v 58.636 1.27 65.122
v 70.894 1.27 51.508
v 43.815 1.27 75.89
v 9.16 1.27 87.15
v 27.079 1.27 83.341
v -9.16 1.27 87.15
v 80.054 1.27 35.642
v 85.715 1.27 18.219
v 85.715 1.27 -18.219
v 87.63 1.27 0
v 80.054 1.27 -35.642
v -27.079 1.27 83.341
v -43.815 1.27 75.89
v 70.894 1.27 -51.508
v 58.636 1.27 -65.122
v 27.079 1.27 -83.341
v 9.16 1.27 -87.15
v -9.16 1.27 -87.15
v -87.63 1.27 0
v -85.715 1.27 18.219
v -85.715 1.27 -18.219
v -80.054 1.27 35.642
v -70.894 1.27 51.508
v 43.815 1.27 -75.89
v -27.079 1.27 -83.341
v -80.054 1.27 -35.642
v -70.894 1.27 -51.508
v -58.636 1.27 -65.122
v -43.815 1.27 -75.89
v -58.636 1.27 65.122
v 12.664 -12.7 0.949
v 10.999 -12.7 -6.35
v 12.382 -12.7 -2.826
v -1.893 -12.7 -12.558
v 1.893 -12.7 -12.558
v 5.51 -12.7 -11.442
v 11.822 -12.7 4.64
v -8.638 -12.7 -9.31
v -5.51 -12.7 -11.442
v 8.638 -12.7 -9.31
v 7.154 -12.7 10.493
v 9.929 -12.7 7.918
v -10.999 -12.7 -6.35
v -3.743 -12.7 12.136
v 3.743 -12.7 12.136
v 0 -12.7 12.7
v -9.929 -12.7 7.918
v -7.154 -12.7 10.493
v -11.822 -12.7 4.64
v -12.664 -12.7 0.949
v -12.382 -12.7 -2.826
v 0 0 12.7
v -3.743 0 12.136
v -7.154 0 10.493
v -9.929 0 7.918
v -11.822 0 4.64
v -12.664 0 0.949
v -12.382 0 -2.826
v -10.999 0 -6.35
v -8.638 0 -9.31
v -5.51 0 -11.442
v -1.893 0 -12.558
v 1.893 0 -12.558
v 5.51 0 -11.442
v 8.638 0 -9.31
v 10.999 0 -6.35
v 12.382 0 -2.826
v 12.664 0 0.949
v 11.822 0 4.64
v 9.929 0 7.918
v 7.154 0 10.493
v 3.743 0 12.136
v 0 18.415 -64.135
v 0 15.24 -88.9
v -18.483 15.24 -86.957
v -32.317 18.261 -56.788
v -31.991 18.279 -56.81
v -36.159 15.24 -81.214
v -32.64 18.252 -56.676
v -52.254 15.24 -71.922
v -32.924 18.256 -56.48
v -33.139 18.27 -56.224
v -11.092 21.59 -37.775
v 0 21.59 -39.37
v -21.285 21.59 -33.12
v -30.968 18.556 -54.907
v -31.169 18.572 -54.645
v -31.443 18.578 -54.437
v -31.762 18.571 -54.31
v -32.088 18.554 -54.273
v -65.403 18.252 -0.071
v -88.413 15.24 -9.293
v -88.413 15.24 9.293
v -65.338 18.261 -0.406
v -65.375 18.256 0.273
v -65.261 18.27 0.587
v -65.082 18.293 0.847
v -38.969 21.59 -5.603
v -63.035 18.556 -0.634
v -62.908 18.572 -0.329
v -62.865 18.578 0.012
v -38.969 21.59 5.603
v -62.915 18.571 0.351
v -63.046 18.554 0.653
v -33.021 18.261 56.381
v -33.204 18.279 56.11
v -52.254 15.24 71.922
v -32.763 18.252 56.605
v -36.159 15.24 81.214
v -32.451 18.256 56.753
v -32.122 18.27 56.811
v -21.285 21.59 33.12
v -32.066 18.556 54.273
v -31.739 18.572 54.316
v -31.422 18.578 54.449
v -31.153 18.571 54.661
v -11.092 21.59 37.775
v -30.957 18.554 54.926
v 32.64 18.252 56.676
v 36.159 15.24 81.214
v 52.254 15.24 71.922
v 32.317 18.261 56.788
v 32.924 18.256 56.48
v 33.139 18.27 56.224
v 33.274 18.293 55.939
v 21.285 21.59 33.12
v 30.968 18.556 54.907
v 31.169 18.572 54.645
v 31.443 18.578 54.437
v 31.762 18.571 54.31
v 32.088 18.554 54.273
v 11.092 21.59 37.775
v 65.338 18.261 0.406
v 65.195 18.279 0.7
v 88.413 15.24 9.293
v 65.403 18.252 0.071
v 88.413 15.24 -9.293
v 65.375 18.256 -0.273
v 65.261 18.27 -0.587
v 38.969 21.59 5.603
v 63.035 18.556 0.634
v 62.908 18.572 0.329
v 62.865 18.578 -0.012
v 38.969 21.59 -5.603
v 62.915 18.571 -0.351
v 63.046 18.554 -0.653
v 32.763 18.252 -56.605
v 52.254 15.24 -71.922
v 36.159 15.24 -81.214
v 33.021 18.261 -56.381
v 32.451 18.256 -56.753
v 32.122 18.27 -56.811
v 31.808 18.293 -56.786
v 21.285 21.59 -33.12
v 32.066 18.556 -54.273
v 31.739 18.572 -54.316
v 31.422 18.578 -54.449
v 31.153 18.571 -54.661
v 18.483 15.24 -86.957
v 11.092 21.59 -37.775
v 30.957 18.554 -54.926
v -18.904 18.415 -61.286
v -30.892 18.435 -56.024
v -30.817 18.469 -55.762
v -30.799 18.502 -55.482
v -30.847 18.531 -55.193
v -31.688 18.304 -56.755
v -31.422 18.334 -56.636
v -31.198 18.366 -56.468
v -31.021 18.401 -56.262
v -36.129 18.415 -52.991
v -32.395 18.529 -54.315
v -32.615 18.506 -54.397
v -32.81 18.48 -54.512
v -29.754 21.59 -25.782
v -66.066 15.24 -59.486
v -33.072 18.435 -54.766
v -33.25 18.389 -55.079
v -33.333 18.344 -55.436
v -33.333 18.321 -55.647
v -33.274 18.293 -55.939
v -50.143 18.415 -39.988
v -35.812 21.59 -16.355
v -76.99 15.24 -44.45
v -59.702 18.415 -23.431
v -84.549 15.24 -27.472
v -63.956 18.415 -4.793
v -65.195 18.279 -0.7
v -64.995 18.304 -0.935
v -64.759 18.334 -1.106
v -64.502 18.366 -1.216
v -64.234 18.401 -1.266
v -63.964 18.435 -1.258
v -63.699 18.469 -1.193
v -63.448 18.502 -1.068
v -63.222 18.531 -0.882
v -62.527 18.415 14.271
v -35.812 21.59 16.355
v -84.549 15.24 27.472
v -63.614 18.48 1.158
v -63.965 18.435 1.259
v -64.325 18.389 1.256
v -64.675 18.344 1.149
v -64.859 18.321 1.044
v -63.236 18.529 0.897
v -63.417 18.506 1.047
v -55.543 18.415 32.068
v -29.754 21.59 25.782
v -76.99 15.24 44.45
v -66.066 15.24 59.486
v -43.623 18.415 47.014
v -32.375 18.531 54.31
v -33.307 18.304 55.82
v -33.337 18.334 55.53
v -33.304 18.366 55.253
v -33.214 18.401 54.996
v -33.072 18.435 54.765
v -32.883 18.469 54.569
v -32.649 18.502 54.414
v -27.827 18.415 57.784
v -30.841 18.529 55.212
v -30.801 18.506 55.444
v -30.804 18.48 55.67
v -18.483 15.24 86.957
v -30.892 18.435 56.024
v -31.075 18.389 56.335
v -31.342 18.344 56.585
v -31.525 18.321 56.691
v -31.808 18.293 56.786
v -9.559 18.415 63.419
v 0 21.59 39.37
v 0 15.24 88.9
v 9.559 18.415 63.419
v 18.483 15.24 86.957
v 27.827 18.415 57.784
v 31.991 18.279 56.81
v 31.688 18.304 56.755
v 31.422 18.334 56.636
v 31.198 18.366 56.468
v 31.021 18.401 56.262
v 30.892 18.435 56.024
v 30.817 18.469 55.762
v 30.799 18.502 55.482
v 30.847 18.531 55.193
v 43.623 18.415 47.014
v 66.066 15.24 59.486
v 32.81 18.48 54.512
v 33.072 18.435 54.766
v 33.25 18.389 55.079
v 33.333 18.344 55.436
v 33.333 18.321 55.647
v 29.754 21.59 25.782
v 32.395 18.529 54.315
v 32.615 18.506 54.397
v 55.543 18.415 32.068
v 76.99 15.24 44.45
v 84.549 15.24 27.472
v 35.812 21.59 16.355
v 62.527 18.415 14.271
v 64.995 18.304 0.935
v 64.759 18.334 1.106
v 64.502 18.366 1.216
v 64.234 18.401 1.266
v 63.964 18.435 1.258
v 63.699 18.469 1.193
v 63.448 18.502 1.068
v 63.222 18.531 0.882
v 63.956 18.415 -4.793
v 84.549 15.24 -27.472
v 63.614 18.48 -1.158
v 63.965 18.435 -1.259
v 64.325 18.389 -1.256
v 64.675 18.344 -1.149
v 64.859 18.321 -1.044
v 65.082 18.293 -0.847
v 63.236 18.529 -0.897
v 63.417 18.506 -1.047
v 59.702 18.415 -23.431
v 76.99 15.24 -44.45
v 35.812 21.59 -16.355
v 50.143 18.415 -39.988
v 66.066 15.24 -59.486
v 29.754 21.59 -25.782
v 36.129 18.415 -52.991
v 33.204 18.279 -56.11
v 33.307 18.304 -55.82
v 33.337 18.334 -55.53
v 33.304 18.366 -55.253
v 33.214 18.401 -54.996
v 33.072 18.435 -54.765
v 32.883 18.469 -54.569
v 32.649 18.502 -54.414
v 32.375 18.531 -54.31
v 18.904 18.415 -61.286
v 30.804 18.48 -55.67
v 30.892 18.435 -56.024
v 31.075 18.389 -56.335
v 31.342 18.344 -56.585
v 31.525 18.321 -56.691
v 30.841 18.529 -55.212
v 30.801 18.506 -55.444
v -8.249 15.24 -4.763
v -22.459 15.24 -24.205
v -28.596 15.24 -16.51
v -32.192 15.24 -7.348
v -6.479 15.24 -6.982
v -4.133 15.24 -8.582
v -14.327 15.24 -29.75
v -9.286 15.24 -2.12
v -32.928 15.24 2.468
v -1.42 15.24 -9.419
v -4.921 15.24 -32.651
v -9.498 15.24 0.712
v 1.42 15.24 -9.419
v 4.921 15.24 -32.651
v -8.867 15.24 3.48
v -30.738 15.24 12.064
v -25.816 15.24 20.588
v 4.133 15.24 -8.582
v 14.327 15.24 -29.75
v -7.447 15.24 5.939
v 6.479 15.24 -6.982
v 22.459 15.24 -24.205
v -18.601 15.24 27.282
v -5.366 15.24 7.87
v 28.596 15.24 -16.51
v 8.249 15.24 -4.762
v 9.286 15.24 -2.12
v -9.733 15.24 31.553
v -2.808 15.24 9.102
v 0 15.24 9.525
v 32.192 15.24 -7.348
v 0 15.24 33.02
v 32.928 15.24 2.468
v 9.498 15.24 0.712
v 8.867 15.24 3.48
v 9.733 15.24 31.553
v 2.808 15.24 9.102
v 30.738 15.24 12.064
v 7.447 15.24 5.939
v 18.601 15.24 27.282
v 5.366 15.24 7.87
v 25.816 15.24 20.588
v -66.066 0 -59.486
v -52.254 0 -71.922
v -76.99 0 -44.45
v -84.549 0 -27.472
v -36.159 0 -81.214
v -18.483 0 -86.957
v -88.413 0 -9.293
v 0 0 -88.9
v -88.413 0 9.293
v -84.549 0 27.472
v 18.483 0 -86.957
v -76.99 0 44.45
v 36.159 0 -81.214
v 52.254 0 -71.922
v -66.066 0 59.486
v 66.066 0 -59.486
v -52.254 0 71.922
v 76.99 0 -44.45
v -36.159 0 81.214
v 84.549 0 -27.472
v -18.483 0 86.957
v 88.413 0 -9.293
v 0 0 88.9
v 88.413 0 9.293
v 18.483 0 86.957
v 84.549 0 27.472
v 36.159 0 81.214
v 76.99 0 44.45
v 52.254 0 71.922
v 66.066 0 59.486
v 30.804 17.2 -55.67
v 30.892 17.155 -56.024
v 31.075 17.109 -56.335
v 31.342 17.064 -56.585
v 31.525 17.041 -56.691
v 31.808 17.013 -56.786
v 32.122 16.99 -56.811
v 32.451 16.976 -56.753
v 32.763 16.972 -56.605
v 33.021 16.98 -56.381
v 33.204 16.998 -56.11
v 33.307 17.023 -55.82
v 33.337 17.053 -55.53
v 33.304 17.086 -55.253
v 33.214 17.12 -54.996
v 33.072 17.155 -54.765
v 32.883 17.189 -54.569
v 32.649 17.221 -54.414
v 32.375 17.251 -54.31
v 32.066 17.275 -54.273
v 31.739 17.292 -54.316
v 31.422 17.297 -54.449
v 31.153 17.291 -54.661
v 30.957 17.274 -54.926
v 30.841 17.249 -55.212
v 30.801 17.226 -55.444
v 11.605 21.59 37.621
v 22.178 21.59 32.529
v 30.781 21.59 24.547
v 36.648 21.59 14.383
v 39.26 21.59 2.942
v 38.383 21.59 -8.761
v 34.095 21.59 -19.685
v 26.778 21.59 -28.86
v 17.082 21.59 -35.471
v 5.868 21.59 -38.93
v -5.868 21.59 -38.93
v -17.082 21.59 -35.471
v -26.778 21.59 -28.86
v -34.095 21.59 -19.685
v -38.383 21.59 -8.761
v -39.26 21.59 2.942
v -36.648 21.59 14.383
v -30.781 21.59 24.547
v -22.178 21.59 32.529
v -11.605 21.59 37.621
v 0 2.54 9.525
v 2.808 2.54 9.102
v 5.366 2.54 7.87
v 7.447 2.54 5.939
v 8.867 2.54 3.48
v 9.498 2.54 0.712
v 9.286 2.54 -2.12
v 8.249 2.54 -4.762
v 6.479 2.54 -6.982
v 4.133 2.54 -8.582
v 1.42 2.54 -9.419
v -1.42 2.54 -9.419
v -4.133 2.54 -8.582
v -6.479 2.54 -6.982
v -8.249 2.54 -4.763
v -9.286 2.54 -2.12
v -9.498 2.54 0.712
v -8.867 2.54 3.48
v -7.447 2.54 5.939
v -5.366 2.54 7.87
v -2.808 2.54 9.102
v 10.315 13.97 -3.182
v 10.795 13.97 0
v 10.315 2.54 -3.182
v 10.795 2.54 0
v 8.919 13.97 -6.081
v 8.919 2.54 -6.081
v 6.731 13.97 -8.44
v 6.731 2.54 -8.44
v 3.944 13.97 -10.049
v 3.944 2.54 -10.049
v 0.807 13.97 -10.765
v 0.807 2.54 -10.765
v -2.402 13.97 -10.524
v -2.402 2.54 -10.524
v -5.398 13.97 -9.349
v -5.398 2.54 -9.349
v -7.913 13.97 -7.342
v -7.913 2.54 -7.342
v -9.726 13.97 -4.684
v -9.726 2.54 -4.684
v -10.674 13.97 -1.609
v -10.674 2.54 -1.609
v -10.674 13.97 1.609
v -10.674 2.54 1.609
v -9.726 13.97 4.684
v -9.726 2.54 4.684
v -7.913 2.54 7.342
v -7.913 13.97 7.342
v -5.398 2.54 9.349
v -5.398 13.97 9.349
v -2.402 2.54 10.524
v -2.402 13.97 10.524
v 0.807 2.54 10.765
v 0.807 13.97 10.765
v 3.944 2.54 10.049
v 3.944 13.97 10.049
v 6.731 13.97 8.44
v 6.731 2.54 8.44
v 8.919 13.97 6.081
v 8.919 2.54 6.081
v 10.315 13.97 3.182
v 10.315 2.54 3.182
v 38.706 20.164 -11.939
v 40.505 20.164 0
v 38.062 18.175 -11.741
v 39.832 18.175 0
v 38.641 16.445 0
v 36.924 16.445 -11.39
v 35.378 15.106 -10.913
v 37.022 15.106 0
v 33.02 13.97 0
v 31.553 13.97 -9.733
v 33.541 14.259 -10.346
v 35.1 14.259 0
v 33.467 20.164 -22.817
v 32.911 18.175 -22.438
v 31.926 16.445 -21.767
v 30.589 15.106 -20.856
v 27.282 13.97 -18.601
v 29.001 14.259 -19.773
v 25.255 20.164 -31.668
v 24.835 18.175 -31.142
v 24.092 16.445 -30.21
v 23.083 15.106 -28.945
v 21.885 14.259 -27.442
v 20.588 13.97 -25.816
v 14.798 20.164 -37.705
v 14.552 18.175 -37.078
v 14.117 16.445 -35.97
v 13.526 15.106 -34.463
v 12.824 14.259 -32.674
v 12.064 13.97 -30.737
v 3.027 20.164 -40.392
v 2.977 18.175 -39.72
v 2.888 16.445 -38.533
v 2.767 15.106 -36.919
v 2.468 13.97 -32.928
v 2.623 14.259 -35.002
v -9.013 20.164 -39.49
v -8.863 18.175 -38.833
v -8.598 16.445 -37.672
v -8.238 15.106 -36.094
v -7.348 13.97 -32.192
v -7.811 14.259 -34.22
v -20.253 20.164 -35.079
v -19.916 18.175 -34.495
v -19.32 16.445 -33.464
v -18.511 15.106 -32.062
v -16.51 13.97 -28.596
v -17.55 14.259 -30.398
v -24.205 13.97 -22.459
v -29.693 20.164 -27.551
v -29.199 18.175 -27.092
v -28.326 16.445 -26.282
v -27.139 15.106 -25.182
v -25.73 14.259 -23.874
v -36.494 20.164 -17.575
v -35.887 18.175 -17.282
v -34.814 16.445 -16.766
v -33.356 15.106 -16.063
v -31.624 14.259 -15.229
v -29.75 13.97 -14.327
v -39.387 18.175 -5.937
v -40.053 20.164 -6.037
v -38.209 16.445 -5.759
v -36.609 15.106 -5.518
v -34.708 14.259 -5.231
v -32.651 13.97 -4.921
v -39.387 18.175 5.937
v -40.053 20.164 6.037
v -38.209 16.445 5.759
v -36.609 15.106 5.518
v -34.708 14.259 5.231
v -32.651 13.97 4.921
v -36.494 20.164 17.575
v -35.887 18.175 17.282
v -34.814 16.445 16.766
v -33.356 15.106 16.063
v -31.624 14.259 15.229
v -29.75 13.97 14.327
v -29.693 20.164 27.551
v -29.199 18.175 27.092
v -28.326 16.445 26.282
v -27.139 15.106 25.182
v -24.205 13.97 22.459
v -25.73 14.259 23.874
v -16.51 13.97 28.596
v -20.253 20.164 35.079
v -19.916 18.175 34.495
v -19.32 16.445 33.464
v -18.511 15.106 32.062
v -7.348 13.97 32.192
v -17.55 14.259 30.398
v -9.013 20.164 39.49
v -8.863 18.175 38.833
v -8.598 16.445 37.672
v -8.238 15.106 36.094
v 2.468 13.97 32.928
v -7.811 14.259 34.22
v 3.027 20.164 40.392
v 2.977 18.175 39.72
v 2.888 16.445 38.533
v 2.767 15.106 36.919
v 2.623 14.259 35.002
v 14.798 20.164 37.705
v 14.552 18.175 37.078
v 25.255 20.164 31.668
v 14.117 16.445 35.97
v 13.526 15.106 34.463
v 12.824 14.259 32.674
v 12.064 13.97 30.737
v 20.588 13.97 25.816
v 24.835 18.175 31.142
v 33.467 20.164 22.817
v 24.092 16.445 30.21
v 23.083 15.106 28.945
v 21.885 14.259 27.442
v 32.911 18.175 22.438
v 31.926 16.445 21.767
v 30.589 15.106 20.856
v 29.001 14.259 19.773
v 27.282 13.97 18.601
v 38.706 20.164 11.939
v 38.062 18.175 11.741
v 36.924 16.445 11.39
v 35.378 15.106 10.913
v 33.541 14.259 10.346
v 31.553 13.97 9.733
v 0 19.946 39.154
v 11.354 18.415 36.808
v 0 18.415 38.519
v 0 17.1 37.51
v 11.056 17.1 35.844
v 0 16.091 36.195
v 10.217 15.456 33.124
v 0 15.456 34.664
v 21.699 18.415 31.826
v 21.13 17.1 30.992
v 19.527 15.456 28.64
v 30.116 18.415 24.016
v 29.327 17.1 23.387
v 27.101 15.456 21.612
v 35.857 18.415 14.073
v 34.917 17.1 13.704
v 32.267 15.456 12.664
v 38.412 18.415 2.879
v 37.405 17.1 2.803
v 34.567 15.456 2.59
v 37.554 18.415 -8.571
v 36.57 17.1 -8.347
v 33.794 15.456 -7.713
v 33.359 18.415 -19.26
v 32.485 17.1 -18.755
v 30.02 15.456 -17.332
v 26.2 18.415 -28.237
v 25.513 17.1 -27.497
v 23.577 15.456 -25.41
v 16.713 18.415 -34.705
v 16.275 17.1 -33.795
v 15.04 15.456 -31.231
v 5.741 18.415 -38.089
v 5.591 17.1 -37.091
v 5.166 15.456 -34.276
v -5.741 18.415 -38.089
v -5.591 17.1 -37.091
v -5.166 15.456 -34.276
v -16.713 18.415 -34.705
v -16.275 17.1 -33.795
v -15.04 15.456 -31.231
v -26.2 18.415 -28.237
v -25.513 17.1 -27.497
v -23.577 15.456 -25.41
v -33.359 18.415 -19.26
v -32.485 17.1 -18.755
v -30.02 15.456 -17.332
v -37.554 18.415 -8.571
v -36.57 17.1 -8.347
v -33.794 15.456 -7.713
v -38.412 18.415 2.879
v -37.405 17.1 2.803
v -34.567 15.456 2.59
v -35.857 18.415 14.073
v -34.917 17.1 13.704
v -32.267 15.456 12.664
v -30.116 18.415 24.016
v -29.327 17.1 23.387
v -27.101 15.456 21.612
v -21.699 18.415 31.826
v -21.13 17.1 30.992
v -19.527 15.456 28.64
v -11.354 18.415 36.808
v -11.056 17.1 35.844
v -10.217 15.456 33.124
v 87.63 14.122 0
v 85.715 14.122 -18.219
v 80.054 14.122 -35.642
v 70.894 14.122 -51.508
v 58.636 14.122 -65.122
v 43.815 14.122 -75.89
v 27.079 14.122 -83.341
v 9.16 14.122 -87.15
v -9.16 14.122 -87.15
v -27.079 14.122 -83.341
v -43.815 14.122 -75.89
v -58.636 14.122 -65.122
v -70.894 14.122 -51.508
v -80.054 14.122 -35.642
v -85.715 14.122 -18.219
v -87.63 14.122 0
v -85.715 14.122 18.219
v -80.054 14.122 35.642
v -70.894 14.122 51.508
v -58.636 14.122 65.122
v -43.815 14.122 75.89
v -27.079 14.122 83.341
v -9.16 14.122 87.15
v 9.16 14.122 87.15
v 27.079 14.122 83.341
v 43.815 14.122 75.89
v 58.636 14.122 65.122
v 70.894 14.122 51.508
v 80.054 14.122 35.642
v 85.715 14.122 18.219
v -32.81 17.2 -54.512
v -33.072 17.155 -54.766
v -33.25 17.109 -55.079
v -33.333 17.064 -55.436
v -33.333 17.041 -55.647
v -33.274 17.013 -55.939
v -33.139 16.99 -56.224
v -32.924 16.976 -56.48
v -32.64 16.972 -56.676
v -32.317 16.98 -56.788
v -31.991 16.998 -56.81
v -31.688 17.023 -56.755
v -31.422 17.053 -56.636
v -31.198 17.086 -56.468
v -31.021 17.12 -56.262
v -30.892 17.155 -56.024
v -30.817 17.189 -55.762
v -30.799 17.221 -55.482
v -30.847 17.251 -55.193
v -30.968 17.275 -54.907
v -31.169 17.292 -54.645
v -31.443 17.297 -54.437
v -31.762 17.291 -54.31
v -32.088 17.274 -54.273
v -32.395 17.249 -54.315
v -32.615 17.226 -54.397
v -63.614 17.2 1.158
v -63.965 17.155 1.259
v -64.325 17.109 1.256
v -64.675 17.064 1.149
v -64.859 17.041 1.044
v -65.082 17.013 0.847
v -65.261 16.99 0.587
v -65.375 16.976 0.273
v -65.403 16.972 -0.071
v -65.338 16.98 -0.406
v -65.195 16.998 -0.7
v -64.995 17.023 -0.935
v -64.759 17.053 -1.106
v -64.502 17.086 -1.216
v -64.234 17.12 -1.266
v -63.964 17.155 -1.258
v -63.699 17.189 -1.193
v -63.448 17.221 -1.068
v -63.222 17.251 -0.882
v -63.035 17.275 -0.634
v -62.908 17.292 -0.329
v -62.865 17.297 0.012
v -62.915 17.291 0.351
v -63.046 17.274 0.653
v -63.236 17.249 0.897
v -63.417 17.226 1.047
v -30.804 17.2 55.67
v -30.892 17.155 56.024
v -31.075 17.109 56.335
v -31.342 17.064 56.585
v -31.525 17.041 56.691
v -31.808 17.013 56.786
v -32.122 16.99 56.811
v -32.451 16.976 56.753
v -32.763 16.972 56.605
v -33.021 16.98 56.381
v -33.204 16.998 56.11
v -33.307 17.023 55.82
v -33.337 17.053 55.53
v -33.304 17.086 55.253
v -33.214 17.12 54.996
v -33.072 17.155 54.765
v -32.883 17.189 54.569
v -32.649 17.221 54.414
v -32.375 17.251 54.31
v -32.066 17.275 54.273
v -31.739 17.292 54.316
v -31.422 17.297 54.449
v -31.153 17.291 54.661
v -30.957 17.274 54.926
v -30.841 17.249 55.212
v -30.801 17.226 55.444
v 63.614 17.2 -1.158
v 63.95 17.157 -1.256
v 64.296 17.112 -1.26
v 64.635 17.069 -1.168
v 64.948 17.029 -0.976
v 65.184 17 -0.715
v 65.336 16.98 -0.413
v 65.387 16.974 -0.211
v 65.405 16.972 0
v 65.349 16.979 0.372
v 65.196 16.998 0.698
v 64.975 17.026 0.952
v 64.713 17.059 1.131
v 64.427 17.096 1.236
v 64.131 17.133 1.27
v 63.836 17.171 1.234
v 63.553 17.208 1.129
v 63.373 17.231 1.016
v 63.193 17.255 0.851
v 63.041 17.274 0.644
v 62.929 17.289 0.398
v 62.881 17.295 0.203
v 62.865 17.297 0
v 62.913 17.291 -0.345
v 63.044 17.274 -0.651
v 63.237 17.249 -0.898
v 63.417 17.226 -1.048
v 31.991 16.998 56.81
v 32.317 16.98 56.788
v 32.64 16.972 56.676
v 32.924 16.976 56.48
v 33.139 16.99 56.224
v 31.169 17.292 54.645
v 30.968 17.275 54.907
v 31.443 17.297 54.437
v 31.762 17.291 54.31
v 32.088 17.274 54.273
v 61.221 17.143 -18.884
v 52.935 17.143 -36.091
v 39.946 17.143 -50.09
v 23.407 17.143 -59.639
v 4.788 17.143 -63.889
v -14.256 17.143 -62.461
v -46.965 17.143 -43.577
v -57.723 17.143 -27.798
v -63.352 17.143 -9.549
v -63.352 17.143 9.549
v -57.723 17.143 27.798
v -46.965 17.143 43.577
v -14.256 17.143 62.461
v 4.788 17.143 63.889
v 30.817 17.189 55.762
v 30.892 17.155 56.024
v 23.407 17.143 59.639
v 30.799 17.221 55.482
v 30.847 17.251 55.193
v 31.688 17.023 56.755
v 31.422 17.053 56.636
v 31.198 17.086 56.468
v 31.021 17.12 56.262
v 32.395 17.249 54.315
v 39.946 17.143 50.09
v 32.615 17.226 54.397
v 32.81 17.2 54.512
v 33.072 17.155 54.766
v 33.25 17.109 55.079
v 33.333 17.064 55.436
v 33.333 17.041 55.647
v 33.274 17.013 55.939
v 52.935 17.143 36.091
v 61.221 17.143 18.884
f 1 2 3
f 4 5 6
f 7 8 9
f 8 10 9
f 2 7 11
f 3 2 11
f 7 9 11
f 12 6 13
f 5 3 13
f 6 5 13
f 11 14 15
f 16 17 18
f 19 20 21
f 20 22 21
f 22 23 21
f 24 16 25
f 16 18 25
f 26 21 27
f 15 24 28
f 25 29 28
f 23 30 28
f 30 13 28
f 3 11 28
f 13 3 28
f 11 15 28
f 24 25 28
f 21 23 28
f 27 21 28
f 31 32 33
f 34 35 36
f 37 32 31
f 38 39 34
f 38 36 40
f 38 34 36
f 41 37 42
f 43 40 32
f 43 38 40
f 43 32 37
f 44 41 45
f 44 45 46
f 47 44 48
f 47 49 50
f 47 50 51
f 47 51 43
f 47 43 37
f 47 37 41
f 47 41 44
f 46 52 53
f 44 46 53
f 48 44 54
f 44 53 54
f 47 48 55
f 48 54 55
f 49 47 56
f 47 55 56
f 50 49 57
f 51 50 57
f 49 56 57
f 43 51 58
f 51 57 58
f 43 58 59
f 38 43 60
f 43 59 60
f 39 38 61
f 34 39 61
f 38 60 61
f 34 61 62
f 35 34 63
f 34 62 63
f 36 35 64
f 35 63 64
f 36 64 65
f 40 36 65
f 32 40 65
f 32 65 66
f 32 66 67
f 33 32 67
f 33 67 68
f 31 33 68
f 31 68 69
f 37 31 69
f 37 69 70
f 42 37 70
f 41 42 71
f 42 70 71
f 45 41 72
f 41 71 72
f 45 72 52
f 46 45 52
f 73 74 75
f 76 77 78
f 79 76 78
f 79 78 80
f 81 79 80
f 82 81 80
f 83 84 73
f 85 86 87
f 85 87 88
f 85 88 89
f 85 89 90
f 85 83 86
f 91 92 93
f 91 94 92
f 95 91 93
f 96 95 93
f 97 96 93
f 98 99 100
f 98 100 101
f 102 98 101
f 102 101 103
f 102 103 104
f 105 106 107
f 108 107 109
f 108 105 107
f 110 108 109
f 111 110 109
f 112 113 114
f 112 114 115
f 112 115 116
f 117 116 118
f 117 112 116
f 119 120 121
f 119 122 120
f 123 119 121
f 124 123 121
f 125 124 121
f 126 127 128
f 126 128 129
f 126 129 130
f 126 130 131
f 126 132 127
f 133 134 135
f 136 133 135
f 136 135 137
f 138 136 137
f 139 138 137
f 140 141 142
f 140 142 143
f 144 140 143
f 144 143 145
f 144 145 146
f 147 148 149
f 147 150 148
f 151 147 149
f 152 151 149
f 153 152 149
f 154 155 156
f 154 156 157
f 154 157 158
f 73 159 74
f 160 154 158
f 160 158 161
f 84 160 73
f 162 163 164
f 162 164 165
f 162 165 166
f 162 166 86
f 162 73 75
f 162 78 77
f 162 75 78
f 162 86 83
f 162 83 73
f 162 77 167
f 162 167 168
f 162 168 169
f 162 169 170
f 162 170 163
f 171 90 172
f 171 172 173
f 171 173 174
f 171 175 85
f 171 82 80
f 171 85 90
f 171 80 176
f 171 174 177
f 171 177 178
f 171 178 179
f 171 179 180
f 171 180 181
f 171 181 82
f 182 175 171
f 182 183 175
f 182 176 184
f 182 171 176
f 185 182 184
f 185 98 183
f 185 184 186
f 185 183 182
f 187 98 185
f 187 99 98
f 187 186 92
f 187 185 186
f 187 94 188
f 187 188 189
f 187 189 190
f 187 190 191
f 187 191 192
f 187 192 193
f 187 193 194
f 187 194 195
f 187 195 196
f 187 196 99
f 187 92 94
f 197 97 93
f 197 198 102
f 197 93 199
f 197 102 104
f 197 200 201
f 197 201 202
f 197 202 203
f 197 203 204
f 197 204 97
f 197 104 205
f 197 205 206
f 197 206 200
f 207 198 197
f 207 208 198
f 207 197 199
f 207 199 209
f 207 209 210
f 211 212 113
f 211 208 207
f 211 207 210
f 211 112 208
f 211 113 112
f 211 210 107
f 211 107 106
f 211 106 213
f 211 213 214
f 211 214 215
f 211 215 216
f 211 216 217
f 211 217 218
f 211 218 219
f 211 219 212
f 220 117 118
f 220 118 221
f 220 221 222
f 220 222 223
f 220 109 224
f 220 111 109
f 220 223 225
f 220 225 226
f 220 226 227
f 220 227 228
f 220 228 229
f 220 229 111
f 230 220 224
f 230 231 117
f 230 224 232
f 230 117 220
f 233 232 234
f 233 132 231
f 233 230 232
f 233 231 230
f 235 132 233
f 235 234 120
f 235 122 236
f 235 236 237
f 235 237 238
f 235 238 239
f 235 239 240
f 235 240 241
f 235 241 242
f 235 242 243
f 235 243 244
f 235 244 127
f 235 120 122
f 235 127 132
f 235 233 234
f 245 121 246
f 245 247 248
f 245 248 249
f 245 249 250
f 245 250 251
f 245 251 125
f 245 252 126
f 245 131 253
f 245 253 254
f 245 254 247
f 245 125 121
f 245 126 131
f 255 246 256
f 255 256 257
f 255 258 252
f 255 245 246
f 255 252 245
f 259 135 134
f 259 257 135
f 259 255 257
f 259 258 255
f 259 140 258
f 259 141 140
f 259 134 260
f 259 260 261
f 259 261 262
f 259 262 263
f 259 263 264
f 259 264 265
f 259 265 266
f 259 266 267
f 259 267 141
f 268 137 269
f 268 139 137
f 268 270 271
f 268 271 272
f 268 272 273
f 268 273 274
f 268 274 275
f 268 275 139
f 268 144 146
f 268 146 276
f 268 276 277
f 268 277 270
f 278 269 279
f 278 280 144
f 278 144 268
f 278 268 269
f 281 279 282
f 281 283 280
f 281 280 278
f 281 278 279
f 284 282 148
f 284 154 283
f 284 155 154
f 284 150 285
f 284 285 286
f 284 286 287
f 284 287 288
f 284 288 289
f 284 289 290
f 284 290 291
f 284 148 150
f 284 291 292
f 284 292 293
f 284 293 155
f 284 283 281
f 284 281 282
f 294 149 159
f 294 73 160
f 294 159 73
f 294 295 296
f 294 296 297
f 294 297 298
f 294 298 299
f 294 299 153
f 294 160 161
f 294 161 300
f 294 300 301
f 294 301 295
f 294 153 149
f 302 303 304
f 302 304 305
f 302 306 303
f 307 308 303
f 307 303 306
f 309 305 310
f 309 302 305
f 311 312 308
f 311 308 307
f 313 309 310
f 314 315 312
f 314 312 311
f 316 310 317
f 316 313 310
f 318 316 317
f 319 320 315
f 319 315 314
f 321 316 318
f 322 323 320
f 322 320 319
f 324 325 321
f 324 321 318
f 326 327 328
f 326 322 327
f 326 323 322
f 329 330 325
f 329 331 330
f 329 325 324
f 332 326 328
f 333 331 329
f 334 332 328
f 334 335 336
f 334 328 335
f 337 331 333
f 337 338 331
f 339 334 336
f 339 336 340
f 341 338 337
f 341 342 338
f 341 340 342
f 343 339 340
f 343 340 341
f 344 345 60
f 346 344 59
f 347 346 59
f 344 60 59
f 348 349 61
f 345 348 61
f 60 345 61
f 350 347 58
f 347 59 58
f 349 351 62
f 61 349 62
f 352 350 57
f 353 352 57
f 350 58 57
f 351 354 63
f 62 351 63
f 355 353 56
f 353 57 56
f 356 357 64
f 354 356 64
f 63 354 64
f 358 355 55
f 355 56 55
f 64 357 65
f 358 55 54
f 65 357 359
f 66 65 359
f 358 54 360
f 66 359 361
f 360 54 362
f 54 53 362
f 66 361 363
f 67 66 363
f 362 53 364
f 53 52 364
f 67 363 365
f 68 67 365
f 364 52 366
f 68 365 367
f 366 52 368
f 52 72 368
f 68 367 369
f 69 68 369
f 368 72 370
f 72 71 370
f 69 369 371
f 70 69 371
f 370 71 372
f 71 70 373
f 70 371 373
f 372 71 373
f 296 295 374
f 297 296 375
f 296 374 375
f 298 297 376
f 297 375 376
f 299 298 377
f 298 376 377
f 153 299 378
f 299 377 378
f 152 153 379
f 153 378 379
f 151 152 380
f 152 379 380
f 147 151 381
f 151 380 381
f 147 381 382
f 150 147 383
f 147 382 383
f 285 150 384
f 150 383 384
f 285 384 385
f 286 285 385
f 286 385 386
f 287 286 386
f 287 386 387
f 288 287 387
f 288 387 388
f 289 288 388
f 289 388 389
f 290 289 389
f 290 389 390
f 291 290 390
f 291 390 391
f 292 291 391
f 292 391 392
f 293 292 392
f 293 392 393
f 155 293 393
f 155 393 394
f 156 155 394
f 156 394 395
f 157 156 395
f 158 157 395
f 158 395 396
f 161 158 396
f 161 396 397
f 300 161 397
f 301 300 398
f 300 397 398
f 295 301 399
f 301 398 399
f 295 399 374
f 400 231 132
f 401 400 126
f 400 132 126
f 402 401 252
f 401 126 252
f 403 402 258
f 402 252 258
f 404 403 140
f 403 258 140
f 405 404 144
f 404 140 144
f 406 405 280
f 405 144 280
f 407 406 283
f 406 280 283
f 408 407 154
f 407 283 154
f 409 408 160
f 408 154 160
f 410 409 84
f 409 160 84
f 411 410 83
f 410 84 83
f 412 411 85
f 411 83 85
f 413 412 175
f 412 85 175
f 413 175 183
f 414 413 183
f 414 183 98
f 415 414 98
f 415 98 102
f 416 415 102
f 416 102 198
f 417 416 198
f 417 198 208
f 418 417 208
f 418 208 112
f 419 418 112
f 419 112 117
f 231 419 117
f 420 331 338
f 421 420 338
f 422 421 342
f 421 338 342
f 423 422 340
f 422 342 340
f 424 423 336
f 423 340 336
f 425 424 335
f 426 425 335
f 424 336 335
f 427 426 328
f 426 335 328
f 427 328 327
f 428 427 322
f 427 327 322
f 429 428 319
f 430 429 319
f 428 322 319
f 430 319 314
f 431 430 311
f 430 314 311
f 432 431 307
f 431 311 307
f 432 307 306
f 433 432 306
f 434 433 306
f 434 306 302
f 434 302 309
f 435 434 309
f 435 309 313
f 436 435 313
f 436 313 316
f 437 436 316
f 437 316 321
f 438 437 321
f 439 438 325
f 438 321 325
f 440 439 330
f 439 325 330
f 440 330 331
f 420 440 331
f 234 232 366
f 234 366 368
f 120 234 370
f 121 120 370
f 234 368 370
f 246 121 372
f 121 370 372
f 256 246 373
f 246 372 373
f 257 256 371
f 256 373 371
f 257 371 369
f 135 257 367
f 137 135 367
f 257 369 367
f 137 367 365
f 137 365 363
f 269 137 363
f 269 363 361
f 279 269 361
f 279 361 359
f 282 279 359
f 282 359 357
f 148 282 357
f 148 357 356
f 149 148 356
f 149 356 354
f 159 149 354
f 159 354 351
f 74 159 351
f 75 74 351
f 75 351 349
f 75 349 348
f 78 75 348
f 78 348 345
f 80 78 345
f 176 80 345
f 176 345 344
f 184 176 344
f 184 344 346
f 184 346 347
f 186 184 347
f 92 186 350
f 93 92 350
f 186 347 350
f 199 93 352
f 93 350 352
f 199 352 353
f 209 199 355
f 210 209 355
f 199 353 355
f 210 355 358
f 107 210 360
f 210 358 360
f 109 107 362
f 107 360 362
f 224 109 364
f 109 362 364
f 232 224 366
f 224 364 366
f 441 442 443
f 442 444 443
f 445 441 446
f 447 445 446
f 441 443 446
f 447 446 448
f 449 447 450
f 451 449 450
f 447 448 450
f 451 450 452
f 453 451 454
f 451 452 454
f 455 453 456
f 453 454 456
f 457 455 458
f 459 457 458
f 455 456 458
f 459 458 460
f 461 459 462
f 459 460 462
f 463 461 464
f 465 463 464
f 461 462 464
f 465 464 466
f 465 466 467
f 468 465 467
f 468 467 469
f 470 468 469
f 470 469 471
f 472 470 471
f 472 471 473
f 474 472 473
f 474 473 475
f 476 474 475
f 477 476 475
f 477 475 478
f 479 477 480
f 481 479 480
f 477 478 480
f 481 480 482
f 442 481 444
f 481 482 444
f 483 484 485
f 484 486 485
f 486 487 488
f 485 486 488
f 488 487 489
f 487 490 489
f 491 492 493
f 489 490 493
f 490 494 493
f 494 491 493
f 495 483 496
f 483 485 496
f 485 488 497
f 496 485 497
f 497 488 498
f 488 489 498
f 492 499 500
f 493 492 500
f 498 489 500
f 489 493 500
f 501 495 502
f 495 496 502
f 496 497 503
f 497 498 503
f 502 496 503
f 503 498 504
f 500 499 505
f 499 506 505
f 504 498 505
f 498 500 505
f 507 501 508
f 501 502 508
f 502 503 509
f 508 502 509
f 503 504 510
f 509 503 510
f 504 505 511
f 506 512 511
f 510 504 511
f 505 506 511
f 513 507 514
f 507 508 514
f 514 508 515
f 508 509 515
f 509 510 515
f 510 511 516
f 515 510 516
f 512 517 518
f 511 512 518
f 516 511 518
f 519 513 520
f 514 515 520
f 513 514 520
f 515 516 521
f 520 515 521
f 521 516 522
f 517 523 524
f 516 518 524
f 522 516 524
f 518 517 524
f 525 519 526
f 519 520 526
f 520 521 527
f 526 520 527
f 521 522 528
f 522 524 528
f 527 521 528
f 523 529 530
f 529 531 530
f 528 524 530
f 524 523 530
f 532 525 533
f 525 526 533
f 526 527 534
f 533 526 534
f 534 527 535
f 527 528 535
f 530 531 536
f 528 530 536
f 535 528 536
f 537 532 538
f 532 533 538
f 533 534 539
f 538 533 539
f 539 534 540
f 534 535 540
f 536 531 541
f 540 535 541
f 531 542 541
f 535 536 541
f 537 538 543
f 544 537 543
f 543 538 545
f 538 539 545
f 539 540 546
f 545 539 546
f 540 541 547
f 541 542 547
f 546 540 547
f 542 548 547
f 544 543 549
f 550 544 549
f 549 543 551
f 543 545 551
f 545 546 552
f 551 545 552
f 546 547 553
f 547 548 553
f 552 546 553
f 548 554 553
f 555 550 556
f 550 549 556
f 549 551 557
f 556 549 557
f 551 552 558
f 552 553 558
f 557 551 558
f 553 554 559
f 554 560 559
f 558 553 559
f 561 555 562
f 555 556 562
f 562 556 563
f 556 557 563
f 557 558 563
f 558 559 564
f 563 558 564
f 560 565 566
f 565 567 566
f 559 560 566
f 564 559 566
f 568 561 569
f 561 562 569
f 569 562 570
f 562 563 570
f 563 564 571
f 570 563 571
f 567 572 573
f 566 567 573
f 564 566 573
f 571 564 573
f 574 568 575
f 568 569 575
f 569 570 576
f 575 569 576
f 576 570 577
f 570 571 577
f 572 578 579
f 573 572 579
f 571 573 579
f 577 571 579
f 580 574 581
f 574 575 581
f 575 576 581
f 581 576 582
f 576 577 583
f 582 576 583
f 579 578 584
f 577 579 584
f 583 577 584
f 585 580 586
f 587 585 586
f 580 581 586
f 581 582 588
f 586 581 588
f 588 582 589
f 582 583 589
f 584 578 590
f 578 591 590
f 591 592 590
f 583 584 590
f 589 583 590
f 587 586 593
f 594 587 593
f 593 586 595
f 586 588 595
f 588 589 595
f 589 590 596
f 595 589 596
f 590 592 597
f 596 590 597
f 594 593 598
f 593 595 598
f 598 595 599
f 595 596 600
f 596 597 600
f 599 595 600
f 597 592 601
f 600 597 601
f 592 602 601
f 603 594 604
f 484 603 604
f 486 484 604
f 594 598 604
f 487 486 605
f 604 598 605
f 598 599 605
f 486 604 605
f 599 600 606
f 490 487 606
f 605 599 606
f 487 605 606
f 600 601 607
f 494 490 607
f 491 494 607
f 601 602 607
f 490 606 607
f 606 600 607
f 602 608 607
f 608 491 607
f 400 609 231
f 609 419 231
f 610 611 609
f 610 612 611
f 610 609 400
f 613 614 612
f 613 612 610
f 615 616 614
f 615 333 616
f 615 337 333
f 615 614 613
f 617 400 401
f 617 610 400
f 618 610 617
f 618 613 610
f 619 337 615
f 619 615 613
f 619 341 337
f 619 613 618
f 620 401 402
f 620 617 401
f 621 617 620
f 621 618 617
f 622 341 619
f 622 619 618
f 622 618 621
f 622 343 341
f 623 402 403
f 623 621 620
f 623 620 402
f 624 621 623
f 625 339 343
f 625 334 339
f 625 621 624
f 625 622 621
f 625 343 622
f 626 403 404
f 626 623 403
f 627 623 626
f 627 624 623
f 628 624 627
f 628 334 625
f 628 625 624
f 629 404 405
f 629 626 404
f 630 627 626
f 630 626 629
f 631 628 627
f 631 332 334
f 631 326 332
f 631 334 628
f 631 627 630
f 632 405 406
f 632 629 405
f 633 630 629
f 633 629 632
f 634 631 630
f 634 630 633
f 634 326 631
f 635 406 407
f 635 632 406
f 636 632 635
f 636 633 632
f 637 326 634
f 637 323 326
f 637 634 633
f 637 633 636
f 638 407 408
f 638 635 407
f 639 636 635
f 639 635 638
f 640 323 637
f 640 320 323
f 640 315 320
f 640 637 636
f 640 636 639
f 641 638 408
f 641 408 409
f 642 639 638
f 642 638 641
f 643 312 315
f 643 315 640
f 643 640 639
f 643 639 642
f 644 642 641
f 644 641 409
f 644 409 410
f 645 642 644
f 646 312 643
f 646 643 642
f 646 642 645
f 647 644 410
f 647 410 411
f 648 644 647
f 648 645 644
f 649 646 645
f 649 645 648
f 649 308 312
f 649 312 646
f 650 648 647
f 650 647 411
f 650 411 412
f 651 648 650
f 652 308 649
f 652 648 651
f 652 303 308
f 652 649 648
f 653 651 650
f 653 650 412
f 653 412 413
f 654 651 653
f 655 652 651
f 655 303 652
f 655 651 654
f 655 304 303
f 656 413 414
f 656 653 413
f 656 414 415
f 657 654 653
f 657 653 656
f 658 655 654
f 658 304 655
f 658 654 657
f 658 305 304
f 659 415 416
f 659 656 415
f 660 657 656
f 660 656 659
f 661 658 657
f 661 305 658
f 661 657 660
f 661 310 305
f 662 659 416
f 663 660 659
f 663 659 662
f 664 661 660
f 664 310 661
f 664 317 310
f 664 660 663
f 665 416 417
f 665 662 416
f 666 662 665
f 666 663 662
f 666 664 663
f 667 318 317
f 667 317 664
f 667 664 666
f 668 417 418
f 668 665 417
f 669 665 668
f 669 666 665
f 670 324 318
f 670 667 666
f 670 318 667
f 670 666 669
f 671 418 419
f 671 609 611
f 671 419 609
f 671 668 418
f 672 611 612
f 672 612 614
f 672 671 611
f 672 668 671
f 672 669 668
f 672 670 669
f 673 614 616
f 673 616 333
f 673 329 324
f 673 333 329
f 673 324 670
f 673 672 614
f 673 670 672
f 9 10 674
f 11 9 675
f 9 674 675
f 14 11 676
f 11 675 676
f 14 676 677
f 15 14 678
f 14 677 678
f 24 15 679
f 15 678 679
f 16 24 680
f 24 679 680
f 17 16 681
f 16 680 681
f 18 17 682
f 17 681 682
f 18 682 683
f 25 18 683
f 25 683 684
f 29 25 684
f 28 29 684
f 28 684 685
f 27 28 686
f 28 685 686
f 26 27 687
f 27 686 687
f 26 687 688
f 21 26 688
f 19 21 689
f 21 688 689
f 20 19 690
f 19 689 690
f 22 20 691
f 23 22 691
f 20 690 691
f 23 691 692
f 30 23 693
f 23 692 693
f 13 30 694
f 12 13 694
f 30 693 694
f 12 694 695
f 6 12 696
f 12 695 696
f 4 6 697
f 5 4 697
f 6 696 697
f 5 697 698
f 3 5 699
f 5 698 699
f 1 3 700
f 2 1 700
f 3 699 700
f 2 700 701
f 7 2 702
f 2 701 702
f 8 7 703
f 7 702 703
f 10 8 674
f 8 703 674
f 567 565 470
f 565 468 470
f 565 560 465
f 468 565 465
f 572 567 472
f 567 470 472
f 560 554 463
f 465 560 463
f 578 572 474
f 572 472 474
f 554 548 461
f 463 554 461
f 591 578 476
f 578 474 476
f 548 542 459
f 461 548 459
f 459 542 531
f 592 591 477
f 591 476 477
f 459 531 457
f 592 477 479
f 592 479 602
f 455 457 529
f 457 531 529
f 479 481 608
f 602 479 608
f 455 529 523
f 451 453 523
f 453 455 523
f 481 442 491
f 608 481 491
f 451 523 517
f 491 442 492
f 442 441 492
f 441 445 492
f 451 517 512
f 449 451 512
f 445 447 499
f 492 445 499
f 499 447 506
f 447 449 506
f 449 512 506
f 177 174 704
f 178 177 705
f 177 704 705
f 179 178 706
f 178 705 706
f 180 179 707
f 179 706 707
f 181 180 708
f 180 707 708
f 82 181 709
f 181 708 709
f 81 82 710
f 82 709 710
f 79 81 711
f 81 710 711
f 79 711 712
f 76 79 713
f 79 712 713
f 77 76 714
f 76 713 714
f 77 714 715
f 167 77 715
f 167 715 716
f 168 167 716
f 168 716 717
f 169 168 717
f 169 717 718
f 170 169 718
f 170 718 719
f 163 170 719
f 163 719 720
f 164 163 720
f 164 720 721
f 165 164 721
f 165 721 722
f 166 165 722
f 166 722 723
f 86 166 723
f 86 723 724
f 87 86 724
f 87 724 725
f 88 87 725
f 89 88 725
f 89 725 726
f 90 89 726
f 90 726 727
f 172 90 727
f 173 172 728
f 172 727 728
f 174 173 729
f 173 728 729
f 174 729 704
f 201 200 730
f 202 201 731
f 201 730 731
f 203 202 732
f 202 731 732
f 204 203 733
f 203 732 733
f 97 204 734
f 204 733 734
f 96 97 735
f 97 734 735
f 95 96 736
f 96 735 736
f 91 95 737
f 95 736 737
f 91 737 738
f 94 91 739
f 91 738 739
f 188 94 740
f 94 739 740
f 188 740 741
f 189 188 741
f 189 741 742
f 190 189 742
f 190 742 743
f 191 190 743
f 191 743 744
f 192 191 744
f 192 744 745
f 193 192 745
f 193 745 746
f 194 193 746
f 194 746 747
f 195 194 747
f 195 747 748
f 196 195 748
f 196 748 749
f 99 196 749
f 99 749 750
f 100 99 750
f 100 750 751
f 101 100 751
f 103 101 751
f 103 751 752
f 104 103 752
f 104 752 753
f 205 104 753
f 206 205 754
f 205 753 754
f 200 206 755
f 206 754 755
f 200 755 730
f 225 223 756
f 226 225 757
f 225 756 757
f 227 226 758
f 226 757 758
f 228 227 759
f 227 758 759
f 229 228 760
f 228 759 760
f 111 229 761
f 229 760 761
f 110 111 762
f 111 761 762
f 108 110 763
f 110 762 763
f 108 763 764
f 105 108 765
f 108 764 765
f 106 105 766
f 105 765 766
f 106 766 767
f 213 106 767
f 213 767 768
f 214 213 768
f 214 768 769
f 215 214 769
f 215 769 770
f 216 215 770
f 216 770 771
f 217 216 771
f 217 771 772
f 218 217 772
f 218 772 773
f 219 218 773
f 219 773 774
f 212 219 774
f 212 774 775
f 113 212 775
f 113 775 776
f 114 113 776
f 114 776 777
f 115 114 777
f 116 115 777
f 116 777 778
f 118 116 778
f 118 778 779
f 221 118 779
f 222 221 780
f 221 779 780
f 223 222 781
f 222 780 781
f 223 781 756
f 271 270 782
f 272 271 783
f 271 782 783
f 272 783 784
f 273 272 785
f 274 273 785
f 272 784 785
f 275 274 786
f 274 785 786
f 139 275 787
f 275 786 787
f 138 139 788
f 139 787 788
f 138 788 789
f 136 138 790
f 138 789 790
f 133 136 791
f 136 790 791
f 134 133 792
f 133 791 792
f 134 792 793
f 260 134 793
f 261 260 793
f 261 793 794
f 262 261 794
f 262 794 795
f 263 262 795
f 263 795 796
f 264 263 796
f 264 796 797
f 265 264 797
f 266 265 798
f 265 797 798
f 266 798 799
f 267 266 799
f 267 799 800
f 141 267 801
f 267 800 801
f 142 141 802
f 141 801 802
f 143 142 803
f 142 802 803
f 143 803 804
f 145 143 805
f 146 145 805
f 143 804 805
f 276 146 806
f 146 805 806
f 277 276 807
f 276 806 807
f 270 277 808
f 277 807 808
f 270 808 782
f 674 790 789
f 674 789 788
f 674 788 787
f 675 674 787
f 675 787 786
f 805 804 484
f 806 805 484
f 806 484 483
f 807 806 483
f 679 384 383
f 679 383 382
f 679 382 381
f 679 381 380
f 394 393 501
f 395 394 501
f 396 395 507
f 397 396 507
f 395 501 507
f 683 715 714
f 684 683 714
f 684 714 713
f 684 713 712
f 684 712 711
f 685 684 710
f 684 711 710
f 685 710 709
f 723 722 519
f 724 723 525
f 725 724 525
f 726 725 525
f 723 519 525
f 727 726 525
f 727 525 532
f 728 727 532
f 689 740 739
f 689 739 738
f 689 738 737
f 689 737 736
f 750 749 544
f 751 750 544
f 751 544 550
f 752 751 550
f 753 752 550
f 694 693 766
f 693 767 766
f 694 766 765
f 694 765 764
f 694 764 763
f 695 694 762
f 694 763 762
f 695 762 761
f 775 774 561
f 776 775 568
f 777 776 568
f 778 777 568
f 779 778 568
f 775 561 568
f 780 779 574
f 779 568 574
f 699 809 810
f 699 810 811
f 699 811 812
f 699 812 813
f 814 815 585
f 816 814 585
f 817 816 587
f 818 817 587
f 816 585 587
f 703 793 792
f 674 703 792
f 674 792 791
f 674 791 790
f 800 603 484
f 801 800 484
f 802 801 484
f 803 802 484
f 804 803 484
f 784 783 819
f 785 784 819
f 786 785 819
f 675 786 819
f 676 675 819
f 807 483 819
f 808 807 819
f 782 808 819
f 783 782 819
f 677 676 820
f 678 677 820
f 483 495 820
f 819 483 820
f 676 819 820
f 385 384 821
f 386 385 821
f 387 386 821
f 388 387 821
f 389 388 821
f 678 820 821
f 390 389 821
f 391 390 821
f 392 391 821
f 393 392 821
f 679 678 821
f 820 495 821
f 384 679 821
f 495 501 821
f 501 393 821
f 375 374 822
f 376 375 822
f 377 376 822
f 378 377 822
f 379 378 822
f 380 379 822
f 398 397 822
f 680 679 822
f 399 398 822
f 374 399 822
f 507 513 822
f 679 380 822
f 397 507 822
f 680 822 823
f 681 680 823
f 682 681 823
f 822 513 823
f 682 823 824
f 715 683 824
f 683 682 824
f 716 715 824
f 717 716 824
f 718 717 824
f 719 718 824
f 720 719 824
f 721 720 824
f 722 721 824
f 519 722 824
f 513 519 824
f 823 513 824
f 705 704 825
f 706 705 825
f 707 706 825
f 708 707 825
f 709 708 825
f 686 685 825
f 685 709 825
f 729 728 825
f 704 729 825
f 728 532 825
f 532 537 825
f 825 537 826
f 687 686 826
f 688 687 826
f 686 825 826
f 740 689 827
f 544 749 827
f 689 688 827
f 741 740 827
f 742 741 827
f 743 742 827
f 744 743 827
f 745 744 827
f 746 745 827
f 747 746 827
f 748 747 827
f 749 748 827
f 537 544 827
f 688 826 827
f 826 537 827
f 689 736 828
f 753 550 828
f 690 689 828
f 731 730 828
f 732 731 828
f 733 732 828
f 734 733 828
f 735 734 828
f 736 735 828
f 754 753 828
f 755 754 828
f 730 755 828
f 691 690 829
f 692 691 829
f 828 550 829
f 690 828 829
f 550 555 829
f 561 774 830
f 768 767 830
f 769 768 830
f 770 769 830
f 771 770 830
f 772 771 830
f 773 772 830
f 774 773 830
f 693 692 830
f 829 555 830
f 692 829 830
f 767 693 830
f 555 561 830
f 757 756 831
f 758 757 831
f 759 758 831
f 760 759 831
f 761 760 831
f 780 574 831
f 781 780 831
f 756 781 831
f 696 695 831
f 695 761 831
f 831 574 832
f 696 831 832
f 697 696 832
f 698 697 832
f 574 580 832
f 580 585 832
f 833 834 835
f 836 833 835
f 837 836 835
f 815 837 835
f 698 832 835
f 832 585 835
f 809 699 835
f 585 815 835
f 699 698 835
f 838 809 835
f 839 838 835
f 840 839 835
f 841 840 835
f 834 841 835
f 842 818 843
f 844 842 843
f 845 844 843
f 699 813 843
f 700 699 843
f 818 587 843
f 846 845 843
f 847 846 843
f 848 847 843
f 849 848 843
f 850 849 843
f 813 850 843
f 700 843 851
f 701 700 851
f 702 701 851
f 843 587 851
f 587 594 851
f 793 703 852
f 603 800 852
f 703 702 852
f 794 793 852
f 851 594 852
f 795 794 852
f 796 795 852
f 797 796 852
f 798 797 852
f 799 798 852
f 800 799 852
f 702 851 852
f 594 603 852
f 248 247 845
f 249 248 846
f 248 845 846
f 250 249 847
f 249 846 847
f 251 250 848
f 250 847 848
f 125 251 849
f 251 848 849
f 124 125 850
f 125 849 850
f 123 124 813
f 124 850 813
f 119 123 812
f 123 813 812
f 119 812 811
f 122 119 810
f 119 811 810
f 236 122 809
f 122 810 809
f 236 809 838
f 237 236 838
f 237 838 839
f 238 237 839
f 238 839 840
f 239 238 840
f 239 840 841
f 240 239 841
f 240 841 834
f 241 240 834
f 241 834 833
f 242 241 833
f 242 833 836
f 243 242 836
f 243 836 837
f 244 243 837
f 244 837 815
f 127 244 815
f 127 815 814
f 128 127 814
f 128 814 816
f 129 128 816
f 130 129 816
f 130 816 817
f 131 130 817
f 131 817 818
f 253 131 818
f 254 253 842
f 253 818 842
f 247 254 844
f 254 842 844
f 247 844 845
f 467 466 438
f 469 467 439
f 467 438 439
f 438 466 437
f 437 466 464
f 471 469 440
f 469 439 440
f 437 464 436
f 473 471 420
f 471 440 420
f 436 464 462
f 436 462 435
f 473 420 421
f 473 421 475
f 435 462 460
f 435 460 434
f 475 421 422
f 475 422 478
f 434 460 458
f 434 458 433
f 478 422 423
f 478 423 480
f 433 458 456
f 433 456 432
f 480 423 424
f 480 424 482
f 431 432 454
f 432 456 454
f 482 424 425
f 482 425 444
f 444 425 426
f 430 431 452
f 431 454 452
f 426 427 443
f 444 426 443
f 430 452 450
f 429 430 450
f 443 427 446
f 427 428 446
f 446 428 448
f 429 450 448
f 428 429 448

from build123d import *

# Parameters (mm, degrees)
SKETCH1_R           = 88.9
BOSS_EXTRUDE1_DEPTH = 15.24
SKETCH2_R           = 39.37
BOSS_EXTRUDE2_DEPTH = 6.35
SKETCH4_R           = 39.37
CUT_EXTRUDE1_DEPTH  = 6.35
FILLET1_R           = 6.35
SKETCH5_R           = 9.525
CUT_EXTRUDE2_DEPTH  = 12.7
SKETCH8_R           = 1.27
CUT_EXTRUDE3_DEPTH  = 6.35
CIRPATTERN1_COUNT   = 6
SKETCH9_R           = 12.7
BOSS_EXTRUDE3_DEPTH = 12.7


# Read off the part's stored shape, not the designer's step: Shell1
with BuildPart() as part:
    # Sketch1 → Boss-Extrude1 (new body)
    with BuildSketch(Plane(origin=(0, 0, 0), x_dir=(1, 0, 0), z_dir=(0, 1, 0))):
        with Locations(Location((0, 0, 0), (0, 0, 270))):
            Circle(SKETCH1_R)
    extrude(amount=BOSS_EXTRUDE1_DEPTH)

    # Sketch2 → Boss-Extrude2 (add)
    with BuildSketch(Plane(origin=(0, 15.24, 0), x_dir=(1, 0, 0), z_dir=(0, 1, 0))):
        with Locations(Location((0, 0, 0), (0, 0, 270))):
            Circle(SKETCH2_R)
    extrude(amount=BOSS_EXTRUDE2_DEPTH)

    # Sketch3 → Revolve1 (revolve)
    with BuildSketch(Plane(origin=(0, 0, 0), x_dir=(0, 0, -1), z_dir=(1, 0, 0)), mode=Mode.PRIVATE) as revolve1_sk:
        Polygon((-39.37, 21.59), (-39.37, 15.24), (-88.9, 15.24), align=None)
    revolve(revolve1_sk.sketch.rotate(Axis((0, 0, 0), (0, 1, 0)), 180), axis=Axis((0, 0, 0), (0, 1, 0)))

    # Sketch4 → Cut-Extrude1 (cut)
    with BuildSketch(Plane(origin=(0, 21.59, 0), x_dir=(1, 0, 0), z_dir=(0, 1, 0))):
        with Locations(Location((0, 0, 0), (0, 0, 270))):
            Circle(SKETCH4_R)
    extrude(amount=-CUT_EXTRUDE1_DEPTH, mode=Mode.SUBTRACT)

    # Fillet1
    fillet1_edges = [part.edges().sort_by_distance(p)[0] for p in [
        (0, 15.24, -39.37),
    ]]
    fillet(fillet1_edges, radius=FILLET1_R - 0.0001)  # a hair under: the kernel refuses the full size

    # Sketch5 → Cut-Extrude2 (cut)
    with BuildSketch(Plane(origin=(0, 15.24, 0), x_dir=(1, 0, 0), z_dir=(0, 1, 0))):
        with Locations(Location((0, 0, 0), (0, 0, 270))):
            Circle(SKETCH5_R)
    extrude(amount=-CUT_EXTRUDE2_DEPTH, mode=Mode.SUBTRACT)

    # Shell1 outline → Shell1 (revolve, cut)
    with BuildSketch(Plane.XY):
        with BuildLine():
            Line((87.63, 14.12242584), (40.505388812, 20.164042659))
            ThreePointArc((40.505388812, 20.164042659), (37.877911334, 15.71930179), (33.02, 13.97))
            Line((33.02, 13.97), (10.795, 13.97))
            Line((10.795, 13.97), (10.795, 2.54))
            Line((10.795, 2.54), (0, 2.54))
            Line((0, 2.54), (0, 1.27))
            Line((0, 1.27), (87.63, 1.27))
            Line((87.63, 1.27), (87.63, 14.12242584))
        make_face()
    revolve(axis=Axis((0, 0, 0), (0, 1, 0)), mode=Mode.SUBTRACT)

    # Sketch8 → Cut-Extrude3 (cut)
    with BuildSketch(Plane(origin=(0, 15.24, 0), x_dir=(-1, 0, 0), z_dir=(0, -1, 0))):
        with Locations(Location((-64.135, 0, 0), (0, 0, 65.776295288))):
            Circle(SKETCH8_R)
    cut_extrude3 = extrude(amount=-CUT_EXTRUDE3_DEPTH, mode=Mode.SUBTRACT)

    # CirPattern1: Cut-Extrude3 ×6 about axis
    cirpattern1_axis = Axis((0, 0, 0), (0, 1, 0))
    for i in range(1, CIRPATTERN1_COUNT):
        add(cut_extrude3.rotate(cirpattern1_axis, i * 360 / CIRPATTERN1_COUNT), mode=Mode.SUBTRACT)

    # Sketch9 → Boss-Extrude3 (add)
    with BuildSketch(Plane.XZ):
        with Locations(Location((0, 0, 0), (0, 0, 90))):
            Circle(SKETCH9_R)
    extrude(amount=BOSS_EXTRUDE3_DEPTH)


solid = part.part
